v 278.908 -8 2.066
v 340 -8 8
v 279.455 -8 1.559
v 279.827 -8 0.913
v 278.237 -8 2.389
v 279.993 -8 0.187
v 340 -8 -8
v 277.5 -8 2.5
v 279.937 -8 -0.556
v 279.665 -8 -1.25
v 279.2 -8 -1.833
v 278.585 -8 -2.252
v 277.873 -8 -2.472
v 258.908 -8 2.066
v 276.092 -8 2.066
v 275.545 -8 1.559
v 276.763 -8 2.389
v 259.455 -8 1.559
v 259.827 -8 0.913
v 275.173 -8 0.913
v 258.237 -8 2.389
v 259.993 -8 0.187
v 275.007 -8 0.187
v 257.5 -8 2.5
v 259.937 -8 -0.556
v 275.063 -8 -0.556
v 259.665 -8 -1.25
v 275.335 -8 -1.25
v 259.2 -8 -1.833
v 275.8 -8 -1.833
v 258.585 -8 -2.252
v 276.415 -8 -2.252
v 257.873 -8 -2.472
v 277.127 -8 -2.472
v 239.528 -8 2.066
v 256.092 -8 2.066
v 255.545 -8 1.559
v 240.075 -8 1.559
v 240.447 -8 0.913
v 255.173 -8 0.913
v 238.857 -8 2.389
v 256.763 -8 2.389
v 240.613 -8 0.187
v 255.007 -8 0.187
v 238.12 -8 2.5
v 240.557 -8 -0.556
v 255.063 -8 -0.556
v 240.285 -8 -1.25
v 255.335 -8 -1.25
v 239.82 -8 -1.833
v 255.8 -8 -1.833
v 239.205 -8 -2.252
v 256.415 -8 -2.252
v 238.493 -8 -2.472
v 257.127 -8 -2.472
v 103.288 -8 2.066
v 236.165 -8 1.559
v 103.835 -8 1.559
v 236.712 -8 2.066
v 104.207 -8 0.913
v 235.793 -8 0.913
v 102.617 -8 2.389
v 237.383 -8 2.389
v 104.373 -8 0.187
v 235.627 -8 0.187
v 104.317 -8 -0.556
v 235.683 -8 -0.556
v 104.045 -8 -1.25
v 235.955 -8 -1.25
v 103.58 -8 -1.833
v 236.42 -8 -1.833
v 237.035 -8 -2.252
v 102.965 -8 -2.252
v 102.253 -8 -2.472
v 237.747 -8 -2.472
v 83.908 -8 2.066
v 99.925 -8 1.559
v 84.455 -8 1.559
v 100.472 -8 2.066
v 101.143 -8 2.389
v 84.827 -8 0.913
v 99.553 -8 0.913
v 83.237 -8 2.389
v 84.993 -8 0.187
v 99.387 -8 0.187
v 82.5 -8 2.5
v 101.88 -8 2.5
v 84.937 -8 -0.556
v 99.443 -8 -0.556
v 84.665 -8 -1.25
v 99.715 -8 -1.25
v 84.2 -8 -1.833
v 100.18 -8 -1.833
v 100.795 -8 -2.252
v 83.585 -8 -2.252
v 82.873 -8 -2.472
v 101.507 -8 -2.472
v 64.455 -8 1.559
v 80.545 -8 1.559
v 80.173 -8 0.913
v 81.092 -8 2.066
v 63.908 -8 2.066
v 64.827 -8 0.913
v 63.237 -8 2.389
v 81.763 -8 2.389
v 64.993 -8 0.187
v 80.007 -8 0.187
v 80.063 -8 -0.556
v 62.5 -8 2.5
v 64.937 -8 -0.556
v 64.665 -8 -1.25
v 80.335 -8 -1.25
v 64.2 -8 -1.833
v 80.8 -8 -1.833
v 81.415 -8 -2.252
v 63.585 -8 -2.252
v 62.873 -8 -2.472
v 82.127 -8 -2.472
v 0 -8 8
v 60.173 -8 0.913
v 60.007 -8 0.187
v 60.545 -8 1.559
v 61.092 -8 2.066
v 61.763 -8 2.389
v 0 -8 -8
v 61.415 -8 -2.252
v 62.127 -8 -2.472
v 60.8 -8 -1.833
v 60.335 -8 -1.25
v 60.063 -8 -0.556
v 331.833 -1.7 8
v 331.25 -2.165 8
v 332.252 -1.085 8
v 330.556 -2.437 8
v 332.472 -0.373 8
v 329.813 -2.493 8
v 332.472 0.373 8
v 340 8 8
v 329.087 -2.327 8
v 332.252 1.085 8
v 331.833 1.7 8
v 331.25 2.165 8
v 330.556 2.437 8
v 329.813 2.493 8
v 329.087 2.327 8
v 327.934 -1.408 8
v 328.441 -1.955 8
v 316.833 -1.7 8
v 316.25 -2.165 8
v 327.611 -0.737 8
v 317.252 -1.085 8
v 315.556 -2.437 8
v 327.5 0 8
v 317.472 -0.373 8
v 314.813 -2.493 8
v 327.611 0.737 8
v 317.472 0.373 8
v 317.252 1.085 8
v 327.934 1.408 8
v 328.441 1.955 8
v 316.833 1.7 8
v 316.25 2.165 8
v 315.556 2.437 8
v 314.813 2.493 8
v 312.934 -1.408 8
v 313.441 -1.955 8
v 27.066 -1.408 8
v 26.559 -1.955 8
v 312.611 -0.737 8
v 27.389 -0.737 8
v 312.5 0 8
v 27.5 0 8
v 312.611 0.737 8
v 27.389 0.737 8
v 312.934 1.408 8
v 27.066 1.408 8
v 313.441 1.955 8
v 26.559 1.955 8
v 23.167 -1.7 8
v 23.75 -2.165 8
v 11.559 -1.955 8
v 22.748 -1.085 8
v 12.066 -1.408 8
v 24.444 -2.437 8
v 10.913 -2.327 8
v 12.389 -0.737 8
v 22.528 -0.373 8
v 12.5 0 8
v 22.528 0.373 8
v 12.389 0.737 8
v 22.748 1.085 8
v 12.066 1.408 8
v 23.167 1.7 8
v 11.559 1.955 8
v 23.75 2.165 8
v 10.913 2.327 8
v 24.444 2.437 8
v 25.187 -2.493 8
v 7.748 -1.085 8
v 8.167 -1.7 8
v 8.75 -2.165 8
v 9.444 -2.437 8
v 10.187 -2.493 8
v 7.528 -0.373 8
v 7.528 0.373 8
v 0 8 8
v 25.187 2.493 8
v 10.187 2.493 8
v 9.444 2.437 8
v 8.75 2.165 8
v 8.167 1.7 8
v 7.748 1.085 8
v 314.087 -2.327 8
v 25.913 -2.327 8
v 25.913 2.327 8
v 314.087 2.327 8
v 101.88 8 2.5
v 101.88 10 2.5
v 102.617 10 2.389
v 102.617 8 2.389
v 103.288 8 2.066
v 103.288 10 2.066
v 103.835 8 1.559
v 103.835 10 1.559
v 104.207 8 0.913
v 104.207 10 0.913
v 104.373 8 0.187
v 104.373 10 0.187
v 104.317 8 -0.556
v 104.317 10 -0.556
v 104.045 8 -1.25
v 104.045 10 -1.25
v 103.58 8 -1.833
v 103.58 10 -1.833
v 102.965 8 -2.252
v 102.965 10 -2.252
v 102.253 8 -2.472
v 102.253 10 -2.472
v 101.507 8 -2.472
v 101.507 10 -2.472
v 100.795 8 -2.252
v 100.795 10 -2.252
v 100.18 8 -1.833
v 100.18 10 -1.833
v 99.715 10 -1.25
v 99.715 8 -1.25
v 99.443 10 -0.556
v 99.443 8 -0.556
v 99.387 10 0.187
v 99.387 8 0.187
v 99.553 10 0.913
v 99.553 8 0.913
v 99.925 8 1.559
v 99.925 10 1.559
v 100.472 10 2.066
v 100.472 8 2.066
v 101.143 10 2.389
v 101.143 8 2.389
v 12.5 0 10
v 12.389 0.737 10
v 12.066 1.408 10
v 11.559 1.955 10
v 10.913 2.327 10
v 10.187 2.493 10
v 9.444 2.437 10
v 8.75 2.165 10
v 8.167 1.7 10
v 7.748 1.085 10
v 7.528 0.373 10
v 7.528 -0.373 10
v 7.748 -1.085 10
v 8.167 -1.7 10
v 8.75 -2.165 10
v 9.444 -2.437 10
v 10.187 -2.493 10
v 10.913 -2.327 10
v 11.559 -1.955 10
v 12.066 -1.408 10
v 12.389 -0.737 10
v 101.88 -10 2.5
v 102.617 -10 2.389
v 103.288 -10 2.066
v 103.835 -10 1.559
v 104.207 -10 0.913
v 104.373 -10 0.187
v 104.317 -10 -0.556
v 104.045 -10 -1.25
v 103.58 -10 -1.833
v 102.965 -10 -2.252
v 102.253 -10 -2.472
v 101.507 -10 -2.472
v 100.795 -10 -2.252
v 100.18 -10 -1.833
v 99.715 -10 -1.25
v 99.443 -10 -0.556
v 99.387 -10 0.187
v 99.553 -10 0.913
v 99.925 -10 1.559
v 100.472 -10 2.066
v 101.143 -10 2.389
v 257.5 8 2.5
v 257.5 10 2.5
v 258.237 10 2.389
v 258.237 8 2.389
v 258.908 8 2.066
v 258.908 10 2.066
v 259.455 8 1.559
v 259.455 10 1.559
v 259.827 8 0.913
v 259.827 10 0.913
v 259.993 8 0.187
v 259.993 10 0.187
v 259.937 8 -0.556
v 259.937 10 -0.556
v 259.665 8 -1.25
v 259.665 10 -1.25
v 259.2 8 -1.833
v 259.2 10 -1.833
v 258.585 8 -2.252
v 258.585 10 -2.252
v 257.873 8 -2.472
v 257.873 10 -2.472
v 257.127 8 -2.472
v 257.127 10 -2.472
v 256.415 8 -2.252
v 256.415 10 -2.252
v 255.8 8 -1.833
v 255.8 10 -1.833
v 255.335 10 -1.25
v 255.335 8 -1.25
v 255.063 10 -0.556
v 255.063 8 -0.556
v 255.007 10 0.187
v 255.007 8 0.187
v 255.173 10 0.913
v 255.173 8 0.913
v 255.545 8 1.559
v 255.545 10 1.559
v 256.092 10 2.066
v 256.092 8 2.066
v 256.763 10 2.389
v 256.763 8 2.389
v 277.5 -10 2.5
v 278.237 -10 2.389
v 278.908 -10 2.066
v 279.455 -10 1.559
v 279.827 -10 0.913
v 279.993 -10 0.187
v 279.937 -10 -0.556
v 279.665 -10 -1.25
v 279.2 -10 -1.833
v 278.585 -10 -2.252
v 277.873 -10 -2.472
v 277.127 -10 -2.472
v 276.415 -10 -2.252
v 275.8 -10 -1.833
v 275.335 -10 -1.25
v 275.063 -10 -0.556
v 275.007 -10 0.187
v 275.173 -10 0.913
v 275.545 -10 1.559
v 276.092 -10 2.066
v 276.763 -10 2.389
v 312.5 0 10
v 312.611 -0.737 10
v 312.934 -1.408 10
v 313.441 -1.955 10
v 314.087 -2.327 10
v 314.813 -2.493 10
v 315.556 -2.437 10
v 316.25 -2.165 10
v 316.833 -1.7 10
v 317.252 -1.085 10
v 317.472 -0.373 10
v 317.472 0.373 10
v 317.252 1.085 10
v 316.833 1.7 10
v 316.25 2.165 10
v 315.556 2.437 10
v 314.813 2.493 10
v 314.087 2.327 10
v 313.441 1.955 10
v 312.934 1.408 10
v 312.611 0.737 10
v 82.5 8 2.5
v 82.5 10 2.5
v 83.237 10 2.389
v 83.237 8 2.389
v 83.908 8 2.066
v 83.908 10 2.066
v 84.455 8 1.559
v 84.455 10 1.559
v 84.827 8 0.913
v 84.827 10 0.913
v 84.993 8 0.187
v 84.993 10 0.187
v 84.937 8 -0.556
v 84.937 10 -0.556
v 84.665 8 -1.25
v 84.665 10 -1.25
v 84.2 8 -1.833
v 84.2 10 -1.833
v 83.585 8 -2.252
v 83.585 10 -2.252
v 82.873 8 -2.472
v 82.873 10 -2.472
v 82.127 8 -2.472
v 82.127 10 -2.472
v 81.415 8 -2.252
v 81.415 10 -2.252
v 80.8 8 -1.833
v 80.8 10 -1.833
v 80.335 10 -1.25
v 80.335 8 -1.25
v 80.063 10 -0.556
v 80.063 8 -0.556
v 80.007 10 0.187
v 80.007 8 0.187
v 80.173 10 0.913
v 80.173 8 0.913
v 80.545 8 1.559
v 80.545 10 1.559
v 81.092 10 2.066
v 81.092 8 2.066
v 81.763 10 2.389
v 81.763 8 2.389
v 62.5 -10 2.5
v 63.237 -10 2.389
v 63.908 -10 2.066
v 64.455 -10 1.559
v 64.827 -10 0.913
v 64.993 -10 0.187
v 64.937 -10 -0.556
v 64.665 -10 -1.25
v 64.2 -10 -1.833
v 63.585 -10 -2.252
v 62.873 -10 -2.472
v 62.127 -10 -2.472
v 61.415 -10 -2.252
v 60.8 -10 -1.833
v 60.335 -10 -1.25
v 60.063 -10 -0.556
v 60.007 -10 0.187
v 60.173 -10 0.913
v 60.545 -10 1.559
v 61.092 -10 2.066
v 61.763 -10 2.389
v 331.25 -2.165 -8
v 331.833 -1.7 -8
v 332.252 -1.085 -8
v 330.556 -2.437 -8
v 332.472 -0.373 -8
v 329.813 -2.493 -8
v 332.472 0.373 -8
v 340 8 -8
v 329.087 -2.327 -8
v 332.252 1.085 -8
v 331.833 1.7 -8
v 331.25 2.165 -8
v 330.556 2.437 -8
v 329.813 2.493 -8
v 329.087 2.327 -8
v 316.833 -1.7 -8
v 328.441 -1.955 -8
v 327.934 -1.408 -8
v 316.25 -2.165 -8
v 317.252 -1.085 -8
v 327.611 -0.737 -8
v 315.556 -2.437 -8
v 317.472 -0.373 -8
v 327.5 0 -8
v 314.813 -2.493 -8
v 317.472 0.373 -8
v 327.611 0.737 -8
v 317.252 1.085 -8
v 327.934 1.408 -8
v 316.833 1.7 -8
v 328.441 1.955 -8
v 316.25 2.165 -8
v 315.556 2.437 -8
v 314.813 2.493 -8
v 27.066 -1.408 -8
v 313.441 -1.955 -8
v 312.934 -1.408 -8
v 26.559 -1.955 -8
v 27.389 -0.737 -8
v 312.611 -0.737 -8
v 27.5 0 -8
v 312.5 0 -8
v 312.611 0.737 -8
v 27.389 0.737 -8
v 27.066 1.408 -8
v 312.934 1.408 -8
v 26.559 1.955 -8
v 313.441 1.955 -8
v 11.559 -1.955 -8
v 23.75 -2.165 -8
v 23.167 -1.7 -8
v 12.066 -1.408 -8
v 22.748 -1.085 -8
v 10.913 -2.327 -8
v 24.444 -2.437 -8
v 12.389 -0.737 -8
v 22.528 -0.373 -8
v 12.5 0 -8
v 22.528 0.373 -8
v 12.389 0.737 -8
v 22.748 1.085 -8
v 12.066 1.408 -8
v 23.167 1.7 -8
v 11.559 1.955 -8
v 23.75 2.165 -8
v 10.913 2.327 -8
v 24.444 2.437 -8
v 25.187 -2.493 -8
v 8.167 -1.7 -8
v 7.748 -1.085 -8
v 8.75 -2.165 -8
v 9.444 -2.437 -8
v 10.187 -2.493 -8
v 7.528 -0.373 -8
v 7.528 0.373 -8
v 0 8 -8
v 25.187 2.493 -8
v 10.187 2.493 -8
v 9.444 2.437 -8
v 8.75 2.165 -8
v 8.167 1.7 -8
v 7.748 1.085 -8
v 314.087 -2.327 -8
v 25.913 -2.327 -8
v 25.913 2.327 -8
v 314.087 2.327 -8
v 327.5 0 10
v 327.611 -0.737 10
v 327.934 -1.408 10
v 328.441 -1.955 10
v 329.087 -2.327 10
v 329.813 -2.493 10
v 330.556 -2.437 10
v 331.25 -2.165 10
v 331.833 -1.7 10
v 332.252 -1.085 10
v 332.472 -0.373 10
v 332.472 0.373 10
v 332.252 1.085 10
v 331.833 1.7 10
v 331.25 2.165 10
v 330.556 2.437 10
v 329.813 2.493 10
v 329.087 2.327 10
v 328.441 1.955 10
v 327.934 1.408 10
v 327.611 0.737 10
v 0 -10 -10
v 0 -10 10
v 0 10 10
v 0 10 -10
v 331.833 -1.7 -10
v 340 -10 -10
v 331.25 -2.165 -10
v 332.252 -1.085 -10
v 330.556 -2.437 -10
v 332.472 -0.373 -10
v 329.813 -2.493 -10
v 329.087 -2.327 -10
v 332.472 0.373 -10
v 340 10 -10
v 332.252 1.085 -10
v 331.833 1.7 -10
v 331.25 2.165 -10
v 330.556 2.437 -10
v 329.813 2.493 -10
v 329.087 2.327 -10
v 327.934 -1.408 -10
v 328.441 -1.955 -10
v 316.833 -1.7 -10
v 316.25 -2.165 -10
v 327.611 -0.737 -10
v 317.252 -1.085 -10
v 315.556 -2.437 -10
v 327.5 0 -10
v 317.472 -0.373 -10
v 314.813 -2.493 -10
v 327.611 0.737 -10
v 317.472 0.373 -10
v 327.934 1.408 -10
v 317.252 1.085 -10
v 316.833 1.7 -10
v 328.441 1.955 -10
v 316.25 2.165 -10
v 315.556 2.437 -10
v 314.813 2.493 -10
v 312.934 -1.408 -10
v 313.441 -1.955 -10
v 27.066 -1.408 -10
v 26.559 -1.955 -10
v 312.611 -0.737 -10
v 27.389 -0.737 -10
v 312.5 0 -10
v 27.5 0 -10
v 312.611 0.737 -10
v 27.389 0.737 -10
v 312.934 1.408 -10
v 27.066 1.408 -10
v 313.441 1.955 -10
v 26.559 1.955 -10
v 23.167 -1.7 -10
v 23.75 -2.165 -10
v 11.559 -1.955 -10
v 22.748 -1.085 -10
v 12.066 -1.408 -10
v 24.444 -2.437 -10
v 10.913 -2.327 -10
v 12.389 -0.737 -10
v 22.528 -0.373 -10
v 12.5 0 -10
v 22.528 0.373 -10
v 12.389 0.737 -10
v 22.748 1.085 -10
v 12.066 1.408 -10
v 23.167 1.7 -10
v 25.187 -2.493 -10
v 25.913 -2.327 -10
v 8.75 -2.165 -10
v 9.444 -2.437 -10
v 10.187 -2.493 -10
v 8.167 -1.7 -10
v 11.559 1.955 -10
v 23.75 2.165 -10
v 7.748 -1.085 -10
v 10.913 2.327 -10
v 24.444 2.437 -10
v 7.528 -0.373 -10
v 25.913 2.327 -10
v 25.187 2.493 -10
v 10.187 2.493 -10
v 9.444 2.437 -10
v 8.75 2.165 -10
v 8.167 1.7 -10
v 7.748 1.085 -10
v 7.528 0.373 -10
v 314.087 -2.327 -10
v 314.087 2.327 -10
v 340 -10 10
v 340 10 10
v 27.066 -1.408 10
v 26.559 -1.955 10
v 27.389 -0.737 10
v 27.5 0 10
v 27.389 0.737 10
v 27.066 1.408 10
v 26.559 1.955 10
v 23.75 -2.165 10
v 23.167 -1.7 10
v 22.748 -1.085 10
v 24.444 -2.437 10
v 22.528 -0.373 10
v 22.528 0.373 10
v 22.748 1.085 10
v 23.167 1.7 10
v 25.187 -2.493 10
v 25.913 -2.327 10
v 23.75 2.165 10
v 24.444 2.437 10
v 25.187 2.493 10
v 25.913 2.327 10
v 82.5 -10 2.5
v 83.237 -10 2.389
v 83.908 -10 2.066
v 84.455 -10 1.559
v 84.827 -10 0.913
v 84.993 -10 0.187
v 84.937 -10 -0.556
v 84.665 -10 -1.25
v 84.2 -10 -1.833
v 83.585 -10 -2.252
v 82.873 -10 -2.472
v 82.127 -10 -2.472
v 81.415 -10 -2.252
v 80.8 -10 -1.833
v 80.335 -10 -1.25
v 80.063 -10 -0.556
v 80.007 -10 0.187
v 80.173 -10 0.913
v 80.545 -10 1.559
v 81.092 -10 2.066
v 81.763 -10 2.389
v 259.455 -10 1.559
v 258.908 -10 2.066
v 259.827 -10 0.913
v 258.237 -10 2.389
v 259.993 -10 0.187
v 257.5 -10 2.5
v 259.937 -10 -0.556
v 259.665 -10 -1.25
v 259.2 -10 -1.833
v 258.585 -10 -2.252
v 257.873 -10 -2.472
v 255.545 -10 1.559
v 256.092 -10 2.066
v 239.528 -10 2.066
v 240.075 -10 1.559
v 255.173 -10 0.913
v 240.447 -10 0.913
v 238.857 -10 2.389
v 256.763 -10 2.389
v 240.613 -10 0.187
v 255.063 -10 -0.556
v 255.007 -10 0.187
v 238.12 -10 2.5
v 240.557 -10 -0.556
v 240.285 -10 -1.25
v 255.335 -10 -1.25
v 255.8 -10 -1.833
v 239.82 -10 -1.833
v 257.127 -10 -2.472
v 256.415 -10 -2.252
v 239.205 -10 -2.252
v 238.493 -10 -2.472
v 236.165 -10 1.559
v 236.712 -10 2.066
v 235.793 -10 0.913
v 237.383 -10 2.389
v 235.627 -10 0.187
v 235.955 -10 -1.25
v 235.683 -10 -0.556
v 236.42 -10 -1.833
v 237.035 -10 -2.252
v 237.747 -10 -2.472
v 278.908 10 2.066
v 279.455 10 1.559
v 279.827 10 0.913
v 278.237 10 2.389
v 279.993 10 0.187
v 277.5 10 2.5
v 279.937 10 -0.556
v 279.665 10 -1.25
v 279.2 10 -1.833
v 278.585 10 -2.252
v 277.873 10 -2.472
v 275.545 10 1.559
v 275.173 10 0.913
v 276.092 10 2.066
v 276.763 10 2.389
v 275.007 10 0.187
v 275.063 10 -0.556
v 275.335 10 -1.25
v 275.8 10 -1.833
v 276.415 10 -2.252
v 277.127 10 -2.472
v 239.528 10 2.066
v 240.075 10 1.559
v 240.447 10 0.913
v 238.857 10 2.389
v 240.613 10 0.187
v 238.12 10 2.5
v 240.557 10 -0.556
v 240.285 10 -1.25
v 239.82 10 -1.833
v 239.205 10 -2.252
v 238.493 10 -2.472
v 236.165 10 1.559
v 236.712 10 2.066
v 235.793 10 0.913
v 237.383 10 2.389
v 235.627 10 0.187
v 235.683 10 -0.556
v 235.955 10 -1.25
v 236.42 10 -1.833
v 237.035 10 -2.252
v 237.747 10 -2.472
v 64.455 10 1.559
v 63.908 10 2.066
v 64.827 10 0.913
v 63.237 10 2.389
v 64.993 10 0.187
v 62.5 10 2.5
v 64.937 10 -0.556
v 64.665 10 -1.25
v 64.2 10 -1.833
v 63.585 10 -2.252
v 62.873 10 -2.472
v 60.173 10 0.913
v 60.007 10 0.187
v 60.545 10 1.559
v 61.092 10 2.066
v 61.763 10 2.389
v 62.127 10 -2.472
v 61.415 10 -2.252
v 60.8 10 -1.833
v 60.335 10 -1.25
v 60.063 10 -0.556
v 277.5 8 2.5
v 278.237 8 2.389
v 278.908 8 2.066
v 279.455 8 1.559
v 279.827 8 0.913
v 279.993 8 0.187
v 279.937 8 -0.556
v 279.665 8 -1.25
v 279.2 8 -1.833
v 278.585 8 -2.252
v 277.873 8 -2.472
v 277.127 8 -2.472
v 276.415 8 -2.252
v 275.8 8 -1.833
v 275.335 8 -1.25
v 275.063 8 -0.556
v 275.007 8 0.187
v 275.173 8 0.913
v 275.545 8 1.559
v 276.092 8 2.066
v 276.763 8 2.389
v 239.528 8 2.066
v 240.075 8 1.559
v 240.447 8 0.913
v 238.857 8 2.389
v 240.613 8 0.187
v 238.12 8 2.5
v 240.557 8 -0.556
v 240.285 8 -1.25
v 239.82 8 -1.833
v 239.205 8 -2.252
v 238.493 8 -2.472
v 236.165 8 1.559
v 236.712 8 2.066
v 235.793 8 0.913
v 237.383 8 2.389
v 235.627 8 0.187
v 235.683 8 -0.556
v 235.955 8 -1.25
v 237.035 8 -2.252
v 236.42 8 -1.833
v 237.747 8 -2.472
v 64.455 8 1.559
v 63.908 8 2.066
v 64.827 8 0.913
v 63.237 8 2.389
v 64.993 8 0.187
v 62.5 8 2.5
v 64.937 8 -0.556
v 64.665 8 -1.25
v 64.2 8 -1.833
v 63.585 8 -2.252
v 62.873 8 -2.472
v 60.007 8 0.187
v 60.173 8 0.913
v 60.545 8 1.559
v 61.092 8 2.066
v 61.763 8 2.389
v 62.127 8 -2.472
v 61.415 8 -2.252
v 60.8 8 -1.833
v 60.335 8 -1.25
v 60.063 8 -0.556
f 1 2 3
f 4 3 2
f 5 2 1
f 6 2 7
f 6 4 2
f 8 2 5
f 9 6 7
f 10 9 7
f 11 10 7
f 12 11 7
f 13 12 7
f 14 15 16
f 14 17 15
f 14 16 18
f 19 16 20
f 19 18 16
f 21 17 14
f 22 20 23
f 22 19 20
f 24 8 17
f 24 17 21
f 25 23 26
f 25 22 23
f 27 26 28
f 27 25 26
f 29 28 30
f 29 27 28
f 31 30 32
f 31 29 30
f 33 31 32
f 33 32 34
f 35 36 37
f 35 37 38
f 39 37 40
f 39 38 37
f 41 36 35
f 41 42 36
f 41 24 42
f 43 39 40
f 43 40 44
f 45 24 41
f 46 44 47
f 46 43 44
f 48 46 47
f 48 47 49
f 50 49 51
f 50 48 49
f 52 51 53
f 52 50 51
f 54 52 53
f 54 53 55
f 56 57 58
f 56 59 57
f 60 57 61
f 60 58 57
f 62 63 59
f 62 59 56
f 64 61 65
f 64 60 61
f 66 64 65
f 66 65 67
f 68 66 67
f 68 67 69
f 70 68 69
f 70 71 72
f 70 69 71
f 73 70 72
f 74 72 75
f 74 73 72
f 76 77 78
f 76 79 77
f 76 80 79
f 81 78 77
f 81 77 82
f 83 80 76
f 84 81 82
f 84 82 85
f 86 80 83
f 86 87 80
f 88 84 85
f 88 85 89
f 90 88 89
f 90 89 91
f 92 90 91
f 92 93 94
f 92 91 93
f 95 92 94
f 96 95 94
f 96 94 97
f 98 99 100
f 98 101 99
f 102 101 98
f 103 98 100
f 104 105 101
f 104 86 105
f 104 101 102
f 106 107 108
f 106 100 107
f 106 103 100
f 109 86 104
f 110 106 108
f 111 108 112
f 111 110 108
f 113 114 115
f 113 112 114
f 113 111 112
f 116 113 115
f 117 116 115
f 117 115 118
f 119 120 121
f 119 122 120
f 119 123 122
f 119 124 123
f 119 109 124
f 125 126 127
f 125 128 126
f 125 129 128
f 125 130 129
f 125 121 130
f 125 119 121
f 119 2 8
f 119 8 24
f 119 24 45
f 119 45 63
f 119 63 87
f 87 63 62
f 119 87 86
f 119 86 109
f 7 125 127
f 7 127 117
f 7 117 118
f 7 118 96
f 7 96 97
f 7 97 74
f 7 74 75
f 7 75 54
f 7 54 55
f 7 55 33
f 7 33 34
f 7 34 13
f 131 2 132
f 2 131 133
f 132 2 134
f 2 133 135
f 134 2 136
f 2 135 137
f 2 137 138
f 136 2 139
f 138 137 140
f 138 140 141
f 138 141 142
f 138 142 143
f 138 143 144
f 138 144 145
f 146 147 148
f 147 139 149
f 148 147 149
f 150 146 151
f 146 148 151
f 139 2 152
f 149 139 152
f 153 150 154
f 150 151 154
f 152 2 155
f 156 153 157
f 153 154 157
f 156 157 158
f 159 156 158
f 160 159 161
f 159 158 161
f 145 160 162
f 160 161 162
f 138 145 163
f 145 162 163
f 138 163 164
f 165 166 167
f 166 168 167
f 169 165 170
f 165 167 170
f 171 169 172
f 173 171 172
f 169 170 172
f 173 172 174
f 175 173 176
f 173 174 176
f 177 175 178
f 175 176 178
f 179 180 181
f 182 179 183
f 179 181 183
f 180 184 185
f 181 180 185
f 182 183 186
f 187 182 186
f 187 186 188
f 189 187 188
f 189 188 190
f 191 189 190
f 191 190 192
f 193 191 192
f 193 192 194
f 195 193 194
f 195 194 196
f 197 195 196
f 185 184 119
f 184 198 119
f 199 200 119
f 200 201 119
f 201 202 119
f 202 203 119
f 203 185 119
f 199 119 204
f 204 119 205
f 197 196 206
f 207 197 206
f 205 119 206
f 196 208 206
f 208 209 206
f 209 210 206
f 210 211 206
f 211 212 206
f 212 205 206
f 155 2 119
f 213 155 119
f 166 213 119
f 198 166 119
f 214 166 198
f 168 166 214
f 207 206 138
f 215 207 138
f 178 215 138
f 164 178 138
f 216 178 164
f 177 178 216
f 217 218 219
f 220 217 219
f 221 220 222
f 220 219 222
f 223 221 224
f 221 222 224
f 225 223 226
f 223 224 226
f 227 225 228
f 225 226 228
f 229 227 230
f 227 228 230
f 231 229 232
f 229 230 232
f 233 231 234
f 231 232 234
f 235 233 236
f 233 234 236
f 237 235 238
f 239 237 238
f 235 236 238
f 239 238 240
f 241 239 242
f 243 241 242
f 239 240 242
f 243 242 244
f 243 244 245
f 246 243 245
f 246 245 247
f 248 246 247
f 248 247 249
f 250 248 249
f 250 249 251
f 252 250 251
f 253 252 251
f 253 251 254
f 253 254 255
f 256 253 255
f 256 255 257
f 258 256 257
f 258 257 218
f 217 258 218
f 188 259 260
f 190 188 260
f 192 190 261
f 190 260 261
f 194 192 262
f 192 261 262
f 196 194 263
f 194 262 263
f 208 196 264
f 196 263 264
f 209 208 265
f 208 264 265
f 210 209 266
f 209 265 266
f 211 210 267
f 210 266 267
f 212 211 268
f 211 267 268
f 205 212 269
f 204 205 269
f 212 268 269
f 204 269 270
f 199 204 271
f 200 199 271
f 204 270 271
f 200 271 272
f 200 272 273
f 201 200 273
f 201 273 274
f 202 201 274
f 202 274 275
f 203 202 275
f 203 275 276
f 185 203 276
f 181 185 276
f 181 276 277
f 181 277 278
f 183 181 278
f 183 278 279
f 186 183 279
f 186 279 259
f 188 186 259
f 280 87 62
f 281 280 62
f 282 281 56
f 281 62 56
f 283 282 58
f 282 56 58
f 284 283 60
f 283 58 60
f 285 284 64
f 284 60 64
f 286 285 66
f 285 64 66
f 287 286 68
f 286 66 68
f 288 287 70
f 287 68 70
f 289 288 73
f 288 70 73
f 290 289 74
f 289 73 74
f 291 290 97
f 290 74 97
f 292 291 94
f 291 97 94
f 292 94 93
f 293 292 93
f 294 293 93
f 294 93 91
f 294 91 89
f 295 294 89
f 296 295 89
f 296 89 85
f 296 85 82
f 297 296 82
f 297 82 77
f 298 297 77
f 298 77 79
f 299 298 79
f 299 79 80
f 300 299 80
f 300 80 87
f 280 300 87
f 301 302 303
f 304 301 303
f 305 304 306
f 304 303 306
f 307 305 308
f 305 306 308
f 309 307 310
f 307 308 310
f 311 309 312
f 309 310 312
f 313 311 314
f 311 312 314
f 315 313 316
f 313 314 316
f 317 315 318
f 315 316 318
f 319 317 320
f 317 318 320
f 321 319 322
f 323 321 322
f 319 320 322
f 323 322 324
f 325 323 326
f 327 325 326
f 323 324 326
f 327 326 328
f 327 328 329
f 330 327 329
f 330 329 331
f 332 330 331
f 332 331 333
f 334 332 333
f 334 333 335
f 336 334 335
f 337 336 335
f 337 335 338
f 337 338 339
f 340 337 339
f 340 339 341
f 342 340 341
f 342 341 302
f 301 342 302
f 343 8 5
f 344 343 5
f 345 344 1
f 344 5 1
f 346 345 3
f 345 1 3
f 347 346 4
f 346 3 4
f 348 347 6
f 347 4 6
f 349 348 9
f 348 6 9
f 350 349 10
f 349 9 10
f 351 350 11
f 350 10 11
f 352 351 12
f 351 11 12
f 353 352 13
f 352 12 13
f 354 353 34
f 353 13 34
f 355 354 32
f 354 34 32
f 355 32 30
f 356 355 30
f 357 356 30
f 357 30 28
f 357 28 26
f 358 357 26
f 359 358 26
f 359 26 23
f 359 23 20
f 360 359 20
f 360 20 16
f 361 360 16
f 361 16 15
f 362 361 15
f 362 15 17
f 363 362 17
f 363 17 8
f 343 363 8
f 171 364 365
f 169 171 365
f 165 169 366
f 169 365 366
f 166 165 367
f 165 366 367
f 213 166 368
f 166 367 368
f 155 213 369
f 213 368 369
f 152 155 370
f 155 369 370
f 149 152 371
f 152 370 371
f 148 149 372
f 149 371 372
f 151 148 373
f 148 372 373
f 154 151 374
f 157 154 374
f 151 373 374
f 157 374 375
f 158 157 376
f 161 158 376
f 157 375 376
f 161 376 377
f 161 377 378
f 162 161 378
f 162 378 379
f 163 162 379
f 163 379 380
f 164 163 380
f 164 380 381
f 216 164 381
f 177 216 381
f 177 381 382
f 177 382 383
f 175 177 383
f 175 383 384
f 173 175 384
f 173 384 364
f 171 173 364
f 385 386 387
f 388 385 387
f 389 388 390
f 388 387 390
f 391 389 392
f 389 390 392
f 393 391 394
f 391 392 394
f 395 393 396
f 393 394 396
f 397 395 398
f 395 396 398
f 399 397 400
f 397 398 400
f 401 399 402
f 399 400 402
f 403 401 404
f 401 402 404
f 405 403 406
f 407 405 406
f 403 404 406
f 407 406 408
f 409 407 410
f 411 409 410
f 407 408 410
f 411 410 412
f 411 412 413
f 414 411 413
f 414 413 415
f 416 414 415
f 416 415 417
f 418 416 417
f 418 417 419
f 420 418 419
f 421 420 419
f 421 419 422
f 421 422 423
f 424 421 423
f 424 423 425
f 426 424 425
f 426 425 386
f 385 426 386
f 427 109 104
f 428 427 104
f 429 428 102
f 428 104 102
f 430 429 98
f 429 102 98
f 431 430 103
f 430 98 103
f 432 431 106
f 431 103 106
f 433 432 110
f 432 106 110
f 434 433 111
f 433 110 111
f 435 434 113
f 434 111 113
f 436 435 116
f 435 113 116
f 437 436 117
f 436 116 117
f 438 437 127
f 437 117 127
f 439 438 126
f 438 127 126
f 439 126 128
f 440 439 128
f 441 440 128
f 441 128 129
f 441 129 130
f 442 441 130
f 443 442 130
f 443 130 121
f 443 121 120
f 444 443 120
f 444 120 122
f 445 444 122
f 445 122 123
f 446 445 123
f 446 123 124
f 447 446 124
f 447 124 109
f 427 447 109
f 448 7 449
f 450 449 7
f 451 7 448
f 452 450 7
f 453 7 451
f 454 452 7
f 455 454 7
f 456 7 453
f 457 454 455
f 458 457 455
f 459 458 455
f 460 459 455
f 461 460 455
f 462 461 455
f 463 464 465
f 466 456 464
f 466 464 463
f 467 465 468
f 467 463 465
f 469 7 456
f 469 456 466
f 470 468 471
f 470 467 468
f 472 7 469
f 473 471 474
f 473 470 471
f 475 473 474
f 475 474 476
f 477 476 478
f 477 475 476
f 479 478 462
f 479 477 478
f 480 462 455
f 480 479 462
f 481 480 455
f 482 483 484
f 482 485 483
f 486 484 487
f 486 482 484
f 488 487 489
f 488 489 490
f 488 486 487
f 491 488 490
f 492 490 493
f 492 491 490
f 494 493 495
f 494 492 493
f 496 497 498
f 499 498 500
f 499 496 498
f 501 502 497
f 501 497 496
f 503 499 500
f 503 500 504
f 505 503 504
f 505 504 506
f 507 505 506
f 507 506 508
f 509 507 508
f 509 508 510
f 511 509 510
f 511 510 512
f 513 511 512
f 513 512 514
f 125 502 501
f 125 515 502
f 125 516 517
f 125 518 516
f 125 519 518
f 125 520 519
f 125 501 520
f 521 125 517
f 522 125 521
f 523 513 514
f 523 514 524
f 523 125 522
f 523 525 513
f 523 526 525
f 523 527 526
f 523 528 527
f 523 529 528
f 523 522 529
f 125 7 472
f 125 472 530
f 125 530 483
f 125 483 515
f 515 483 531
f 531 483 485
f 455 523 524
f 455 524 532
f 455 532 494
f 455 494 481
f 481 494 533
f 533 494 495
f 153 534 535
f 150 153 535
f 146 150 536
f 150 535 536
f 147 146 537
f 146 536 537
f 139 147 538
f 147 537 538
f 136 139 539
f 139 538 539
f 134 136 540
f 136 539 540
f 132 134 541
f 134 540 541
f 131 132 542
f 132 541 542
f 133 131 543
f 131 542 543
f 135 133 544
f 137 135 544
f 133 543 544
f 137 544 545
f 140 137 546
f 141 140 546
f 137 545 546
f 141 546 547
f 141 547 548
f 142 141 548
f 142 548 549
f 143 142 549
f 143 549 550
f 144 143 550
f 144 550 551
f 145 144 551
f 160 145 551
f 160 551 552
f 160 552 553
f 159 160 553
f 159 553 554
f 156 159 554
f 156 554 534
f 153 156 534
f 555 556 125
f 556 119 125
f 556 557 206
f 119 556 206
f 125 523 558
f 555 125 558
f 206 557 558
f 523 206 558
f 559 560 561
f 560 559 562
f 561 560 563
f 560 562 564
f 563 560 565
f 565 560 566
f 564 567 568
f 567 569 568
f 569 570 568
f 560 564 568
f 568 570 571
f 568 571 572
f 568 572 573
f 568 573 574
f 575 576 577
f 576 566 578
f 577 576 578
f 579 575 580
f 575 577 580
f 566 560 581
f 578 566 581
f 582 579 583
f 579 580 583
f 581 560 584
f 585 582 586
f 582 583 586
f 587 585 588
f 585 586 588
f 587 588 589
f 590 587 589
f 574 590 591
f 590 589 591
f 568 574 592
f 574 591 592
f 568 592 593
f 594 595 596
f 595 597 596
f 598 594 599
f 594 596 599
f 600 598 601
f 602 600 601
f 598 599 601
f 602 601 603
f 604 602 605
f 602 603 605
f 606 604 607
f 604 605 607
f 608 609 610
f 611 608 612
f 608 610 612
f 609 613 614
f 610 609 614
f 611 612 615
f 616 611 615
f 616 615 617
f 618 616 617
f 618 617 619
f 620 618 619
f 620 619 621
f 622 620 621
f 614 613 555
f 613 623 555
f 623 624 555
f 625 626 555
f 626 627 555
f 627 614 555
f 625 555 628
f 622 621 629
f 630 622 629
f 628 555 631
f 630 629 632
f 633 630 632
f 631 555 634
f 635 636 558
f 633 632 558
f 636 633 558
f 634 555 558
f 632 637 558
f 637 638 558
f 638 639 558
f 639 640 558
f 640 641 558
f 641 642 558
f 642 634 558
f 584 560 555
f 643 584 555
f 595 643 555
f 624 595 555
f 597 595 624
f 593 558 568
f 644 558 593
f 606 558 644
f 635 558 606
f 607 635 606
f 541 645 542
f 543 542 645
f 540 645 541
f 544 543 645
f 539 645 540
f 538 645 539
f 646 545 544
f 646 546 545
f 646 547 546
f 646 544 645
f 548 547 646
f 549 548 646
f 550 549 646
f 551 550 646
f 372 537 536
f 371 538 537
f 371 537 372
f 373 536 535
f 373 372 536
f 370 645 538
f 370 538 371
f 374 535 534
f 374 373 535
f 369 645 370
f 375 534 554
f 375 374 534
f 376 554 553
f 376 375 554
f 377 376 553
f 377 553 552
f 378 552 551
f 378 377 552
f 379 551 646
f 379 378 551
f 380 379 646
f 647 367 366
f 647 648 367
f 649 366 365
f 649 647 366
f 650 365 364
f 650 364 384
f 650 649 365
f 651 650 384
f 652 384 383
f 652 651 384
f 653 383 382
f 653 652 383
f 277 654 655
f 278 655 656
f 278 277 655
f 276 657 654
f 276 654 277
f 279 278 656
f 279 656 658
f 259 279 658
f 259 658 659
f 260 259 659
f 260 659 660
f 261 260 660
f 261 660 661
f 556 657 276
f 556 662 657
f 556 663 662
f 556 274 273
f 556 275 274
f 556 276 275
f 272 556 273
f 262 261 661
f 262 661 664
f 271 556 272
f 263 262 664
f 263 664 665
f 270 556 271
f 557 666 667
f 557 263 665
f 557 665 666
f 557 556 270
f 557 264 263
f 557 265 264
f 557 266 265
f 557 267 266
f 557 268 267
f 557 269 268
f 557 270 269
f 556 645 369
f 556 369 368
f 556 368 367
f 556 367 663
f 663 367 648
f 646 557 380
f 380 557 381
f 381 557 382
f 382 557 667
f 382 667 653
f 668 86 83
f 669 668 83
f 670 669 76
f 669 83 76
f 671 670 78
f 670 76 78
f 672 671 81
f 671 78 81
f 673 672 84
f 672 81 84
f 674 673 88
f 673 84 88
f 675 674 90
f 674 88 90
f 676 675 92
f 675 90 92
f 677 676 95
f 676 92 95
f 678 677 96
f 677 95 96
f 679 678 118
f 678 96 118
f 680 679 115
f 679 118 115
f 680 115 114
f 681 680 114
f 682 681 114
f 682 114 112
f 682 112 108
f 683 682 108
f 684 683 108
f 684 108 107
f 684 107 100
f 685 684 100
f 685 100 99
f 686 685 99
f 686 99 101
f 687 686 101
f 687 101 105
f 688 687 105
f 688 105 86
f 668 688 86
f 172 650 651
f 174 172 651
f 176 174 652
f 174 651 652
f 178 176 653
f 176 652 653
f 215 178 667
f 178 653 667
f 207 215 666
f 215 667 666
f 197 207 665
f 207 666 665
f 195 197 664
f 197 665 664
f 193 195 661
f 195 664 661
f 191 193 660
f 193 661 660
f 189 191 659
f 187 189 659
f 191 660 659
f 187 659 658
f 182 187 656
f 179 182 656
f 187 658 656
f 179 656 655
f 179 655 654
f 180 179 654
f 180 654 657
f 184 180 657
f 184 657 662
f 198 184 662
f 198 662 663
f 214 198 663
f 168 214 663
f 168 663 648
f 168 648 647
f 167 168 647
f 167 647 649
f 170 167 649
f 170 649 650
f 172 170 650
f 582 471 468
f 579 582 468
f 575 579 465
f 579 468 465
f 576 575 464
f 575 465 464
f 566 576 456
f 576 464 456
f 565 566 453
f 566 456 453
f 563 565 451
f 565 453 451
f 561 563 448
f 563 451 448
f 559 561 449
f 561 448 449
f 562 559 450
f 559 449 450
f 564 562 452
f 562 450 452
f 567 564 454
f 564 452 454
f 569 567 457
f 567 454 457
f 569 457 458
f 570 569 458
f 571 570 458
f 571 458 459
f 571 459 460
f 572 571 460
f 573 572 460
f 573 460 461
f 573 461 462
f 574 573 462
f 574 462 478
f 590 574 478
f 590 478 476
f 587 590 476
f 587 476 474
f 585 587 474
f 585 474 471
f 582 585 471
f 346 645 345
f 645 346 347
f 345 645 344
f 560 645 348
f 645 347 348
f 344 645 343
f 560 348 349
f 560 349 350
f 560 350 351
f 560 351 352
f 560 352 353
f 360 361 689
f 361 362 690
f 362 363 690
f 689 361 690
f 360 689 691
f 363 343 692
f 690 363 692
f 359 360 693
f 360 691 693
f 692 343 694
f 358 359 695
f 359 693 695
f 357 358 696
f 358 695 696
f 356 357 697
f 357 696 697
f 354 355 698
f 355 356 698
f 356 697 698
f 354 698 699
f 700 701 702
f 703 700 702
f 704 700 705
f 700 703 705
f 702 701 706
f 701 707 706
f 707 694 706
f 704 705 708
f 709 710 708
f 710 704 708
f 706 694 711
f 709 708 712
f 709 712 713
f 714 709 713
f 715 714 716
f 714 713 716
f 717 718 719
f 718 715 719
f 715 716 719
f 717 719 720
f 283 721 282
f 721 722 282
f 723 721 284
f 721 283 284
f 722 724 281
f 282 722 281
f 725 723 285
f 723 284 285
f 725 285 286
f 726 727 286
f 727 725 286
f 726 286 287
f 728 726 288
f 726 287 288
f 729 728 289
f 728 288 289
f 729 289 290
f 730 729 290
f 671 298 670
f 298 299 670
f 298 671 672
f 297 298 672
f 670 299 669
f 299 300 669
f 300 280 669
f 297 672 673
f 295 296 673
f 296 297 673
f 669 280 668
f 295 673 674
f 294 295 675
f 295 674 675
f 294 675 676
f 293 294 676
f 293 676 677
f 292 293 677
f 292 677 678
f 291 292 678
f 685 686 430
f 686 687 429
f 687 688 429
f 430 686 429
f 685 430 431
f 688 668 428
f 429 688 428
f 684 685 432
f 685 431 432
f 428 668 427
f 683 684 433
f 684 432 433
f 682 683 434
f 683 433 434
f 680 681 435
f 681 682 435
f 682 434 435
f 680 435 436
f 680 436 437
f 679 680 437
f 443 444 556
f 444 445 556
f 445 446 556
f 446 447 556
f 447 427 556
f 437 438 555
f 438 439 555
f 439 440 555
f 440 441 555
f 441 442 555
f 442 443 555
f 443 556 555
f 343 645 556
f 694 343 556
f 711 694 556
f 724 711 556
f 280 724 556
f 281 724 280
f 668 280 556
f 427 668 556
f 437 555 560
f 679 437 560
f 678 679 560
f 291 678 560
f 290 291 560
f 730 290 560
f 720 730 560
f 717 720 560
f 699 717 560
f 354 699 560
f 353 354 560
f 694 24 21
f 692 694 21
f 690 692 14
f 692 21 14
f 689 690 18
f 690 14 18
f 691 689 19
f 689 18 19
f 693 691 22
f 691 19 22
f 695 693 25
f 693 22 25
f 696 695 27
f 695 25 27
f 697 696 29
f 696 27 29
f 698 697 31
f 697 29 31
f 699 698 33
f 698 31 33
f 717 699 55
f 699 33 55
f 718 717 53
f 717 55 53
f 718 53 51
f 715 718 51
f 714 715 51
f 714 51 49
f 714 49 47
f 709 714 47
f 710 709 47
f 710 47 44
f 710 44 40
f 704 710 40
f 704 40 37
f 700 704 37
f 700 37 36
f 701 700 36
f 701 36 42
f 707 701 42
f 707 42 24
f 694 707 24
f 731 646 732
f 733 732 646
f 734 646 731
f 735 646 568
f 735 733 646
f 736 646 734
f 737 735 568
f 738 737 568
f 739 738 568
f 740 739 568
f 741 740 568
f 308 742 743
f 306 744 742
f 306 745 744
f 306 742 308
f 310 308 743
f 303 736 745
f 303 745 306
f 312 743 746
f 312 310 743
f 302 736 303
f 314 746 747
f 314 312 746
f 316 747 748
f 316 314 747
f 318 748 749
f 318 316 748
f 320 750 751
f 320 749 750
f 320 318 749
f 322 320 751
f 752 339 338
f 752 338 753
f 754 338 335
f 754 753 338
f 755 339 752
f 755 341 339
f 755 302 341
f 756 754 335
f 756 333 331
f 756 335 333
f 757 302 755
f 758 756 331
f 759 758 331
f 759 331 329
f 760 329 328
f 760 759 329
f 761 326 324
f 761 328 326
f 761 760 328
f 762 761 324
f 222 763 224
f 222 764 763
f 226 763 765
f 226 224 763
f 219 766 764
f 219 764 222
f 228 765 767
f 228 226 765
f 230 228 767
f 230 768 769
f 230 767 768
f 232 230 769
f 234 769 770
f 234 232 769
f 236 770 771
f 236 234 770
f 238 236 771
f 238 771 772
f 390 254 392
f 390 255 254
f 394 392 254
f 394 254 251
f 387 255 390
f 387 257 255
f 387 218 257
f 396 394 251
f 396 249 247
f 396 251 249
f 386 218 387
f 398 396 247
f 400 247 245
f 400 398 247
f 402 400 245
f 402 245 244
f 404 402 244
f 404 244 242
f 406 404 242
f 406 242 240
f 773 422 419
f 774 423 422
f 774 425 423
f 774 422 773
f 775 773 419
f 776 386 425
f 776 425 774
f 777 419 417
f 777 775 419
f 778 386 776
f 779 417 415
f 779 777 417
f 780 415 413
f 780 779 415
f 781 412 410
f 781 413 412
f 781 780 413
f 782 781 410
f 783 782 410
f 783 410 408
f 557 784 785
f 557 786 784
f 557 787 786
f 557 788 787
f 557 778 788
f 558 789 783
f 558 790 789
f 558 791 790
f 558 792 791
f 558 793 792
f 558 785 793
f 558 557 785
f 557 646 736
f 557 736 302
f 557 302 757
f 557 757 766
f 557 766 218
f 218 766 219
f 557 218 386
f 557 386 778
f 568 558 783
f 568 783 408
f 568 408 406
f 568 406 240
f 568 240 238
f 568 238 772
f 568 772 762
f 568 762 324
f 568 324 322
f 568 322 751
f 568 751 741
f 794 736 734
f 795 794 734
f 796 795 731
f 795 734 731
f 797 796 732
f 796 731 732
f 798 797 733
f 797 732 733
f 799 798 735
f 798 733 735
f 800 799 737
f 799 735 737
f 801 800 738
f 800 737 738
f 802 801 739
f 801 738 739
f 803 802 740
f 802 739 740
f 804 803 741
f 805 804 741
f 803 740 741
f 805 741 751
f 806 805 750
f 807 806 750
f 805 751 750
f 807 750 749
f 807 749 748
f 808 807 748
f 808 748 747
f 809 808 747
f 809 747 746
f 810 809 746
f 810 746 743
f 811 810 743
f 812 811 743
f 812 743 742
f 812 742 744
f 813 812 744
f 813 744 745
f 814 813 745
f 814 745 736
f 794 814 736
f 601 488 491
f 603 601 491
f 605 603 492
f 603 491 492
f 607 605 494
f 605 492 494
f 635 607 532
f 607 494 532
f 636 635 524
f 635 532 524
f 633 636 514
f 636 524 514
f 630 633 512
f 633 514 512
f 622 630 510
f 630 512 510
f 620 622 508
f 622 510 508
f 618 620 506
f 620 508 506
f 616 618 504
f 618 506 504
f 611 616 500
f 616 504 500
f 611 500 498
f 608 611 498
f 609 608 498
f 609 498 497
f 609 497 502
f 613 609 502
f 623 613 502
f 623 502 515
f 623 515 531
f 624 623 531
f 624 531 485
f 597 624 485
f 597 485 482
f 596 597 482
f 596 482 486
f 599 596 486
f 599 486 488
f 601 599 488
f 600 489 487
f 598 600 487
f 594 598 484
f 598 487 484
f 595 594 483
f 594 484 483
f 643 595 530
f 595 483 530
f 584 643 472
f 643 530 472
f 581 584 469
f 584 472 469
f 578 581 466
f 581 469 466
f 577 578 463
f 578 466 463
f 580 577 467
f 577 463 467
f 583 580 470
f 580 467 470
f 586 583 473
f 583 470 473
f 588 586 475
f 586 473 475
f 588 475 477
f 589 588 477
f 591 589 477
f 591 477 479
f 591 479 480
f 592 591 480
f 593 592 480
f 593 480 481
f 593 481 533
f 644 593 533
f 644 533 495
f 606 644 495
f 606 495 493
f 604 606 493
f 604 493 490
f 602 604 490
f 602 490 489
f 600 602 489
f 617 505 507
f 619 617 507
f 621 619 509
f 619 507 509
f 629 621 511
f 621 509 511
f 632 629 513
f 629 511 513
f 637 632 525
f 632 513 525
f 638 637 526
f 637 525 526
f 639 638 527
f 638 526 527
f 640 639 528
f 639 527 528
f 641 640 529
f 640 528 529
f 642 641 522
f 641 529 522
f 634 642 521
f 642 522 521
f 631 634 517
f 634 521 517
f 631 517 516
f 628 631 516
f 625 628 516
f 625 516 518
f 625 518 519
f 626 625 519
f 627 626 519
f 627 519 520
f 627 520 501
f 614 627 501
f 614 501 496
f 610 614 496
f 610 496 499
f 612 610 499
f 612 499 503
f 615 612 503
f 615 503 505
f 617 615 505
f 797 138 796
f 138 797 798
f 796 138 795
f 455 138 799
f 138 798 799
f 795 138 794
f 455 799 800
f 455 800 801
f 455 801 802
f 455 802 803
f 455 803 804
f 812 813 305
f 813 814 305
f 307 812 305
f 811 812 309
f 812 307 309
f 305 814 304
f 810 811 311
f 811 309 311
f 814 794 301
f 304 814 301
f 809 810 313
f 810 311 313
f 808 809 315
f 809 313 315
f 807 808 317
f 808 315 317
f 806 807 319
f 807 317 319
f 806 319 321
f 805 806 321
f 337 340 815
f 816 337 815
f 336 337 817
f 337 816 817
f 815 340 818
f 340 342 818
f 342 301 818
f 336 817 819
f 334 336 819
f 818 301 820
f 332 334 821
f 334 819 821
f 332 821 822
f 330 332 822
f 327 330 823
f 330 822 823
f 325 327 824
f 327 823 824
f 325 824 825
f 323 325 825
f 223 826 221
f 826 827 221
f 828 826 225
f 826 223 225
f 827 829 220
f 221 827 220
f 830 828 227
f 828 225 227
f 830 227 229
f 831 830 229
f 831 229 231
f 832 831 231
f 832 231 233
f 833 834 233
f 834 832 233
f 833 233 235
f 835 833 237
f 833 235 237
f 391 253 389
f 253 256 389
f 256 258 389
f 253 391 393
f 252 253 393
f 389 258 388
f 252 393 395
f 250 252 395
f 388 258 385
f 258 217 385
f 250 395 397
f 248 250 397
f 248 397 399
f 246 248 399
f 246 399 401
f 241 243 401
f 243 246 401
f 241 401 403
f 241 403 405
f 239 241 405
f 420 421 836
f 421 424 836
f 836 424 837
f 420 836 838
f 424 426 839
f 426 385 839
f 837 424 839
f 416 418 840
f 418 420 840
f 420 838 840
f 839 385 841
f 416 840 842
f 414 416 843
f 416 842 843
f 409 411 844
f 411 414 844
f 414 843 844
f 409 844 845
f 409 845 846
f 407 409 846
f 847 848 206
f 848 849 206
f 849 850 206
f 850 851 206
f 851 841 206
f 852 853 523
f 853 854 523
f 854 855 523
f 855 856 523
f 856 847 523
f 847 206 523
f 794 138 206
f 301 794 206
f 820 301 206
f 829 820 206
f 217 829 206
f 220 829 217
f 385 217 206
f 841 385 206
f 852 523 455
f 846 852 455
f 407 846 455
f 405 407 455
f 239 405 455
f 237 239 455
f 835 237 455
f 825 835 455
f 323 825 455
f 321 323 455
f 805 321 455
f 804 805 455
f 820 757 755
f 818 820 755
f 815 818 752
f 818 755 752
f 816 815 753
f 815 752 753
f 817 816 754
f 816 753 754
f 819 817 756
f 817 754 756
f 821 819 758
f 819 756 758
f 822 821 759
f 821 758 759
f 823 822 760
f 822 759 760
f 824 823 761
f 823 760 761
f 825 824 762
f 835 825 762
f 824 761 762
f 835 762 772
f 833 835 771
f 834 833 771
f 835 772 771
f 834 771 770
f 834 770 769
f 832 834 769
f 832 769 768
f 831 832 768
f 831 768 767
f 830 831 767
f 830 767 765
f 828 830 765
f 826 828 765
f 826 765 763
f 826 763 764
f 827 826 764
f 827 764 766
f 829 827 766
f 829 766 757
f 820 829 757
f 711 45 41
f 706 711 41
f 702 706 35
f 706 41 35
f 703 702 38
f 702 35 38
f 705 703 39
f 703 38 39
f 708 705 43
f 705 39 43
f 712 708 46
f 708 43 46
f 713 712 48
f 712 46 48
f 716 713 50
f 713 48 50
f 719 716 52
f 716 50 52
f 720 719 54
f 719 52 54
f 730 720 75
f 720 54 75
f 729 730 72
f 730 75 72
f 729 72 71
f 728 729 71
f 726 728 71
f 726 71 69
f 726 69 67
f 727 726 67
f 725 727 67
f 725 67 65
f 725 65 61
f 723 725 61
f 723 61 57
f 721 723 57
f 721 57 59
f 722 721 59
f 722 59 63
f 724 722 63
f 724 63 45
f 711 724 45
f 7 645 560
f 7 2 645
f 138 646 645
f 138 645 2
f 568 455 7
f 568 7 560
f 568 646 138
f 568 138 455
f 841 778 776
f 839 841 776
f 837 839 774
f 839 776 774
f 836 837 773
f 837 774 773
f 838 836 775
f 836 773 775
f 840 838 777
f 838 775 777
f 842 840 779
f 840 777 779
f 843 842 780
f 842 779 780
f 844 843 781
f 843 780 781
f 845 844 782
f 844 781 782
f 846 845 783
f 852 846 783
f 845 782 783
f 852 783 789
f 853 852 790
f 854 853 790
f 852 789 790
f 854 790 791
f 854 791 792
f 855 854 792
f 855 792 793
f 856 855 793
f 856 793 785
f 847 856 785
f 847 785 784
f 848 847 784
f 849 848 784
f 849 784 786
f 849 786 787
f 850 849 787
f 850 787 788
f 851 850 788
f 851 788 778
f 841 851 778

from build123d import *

# Parameters (mm, degrees)
SKETCH1_W           = 20
SKETCH1_H           = 20
SKETCH1_W_2         = 16
SKETCH1_H_2         = 16
BOSS_EXTRUDE1_DEPTH = 340
SKETCH2_R           = 2.5
CUT_EXTRUDE1_DEPTH  = 341.734500748
SKETCH3_R           = 2.5
CUT_EXTRUDE2_DEPTH  = 341.734500748
SKETCH4_R           = 2.5
CUT_EXTRUDE3_DEPTH  = 341.734500748


with BuildPart() as part:
    # Sketch1 → Boss-Extrude1 (new body)
    with BuildSketch(Plane(origin=(0, 0, 0), x_dir=(0, 0, -1), z_dir=(1, 0, 0))):
        Rectangle(SKETCH1_W, SKETCH1_H)
        Rectangle(SKETCH1_W_2, SKETCH1_H_2, mode=Mode.SUBTRACT)
    extrude(amount=BOSS_EXTRUDE1_DEPTH)

    # Sketch2 → Cut-Extrude1 (cut, through all)
    with BuildSketch(Plane.XY.offset(10)):
        with Locations((10, 0)):
            Circle(SKETCH2_R)
        with Locations((25, 0)):
            Circle(SKETCH2_R)
        with Locations(Location((315, 0, 0), (0, 0, 180))):
            Circle(SKETCH2_R)
        with Locations(Location((330, 0, 0), (0, 0, 180))):
            Circle(SKETCH2_R)
    extrude(amount=-CUT_EXTRUDE1_DEPTH, mode=Mode.SUBTRACT)

    # Sketch3 → Cut-Extrude2 (cut, through all)
    with BuildSketch(Plane(origin=(0, 10, 0), x_dir=(1, 0, 0), z_dir=(0, 1, 0))):
        with Locations(Location((62.5, 0, 0), (0, 0, 270))):
            Circle(SKETCH3_R)
        with Locations(Location((82.5, 0, 0), (0, 0, 270))):
            Circle(SKETCH3_R)
        with Locations(Location((257.5, 0, 0), (0, 0, 270))):
            Circle(SKETCH3_R)
        with Locations(Location((277.5, 0, 0), (0, 0, 270))):
            Circle(SKETCH3_R)
    extrude(amount=-CUT_EXTRUDE2_DEPTH, mode=Mode.SUBTRACT)

    # Sketch4 → Cut-Extrude3 (cut, through all)
    with BuildSketch(Plane(origin=(0, 10, 0), x_dir=(1, 0, 0), z_dir=(0, 1, 0))):
        with Locations(Location((101.88, 0, 0), (0, 0, 270))):
            Circle(SKETCH4_R)
        with Locations(Location((238.12, 0, 0), (0, 0, 270))):
            Circle(SKETCH4_R)
    extrude(amount=-CUT_EXTRUDE3_DEPTH, mode=Mode.SUBTRACT)


solid = part.part
